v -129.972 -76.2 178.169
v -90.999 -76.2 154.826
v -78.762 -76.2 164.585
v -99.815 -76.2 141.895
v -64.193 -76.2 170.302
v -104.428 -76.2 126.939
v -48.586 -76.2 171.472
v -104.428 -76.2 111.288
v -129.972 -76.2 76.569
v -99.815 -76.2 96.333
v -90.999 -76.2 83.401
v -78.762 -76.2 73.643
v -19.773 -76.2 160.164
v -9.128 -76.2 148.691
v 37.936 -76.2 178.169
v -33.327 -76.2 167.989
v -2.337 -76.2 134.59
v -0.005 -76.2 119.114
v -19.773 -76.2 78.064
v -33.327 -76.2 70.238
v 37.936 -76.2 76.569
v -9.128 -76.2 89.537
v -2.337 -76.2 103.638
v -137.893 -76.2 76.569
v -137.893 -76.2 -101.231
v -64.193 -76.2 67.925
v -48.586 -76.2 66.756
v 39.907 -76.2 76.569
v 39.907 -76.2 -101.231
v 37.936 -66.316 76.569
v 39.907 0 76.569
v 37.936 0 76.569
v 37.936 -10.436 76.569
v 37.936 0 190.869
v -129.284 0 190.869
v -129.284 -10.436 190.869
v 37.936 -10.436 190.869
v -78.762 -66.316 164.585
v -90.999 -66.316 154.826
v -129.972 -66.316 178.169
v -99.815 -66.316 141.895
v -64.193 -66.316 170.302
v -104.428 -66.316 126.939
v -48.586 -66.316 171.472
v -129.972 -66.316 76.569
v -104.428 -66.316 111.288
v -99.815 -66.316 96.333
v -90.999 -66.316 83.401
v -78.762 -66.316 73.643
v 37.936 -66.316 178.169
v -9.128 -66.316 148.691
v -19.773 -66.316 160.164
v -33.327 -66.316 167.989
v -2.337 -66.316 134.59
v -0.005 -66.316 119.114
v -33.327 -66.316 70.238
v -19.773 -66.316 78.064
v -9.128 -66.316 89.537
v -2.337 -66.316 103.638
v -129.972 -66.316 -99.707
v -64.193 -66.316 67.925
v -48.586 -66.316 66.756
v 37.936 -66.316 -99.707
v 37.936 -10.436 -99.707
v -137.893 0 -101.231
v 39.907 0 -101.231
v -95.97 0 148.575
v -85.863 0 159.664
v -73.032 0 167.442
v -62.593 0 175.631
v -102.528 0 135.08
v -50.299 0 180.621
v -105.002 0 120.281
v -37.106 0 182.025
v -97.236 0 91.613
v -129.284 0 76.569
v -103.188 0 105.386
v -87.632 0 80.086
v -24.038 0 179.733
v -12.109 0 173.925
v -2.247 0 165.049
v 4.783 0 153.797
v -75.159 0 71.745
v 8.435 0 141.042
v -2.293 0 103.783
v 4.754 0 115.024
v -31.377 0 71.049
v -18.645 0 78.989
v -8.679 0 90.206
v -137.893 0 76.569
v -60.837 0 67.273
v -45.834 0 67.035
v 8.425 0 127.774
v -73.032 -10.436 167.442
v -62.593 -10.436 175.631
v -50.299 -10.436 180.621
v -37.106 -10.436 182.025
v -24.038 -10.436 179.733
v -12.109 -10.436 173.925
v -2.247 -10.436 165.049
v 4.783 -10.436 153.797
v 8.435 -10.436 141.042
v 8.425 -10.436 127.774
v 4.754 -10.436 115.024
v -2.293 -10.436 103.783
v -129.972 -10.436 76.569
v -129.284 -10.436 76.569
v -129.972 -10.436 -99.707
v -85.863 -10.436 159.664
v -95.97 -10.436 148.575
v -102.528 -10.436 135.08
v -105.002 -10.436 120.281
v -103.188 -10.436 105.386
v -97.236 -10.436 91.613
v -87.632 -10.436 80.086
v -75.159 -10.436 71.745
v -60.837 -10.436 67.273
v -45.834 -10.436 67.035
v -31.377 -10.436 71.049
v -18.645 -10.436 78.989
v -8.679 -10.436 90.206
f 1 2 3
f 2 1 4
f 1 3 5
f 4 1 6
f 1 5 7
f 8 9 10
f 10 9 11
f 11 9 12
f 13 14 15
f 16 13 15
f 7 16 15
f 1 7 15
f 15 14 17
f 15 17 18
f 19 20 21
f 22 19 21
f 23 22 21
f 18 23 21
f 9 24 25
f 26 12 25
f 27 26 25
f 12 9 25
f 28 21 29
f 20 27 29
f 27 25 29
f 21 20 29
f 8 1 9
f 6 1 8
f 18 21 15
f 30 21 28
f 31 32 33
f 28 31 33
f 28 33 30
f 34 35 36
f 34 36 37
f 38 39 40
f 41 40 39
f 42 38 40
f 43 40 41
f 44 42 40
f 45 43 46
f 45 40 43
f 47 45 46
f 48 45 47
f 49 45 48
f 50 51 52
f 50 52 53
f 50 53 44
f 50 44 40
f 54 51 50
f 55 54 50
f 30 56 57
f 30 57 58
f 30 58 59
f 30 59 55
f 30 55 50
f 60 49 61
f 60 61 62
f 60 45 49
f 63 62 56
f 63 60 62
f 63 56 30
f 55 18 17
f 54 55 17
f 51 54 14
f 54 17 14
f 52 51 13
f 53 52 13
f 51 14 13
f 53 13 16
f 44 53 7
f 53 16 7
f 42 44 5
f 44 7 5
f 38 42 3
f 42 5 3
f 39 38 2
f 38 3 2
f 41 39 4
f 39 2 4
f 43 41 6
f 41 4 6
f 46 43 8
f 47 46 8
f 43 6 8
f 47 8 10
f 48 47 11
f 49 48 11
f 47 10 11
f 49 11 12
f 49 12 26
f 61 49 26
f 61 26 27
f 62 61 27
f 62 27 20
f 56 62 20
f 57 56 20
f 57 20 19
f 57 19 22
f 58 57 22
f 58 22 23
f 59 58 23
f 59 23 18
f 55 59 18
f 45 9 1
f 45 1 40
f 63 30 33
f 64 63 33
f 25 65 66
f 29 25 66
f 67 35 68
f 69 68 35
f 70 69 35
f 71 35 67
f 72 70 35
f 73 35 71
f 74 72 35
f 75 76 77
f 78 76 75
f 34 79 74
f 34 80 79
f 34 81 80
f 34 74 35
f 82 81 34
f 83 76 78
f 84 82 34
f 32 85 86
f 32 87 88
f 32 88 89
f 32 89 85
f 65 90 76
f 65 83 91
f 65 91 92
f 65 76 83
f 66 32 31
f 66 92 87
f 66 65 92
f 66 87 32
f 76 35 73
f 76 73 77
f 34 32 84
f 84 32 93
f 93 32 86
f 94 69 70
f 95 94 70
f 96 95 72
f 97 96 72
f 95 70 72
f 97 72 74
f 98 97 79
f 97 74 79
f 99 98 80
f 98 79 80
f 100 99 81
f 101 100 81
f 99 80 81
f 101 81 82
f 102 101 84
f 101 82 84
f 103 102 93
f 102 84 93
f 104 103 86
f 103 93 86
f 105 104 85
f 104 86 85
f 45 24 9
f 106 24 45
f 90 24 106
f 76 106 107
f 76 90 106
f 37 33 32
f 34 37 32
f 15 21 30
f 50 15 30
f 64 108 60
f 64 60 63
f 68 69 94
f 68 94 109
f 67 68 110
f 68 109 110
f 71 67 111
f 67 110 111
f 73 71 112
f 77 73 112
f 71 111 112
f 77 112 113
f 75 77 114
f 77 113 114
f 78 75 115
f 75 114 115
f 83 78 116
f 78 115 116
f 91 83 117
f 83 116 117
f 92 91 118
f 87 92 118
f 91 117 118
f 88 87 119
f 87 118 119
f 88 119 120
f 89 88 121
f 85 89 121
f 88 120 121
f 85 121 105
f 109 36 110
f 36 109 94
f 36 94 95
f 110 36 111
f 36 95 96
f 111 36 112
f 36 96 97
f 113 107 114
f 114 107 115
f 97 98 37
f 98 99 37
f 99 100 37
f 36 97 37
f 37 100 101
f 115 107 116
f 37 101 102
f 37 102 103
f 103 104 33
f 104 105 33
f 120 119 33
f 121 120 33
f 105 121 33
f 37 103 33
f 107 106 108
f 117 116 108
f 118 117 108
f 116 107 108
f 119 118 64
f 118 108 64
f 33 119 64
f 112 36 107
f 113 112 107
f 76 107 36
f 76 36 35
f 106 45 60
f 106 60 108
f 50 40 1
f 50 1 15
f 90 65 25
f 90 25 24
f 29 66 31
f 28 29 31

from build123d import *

# Parameters (mm, degrees)
F0_W      = 177.8
F0_H      = 177.8
F1_DEPTH  = 76.2
F2_W      = 167.9080887029
F2_H      = 55.88
F3_DEPTH  = 176.276
F4_W      = 167.9080887029
F4_H      = 9.8836272268
F5_DEPTH  = 101.6
F6_W      = 167.2196879183
F6_H      = 10.4363727732
F7_DEPTH  = 114.3
F8_R      = 47.6089031409
F9_DEPTH  = 41.91
F10_R     = 52.5050220685
F11_DEPTH = 159.004


with BuildPart() as f1:
    # F0 (on Front) → F1 (new body)
    with BuildSketch(Plane.XZ):
        with Locations((-48.9930282295, -12.3306500904)):
            Rectangle(F0_W, F0_H)
    extrude(amount=F1_DEPTH)

    # F2 (on face) → F3 (cut)
    with BuildSketch(Plane.XY.offset(76.5693499096)):
        with Locations((-46.0179038346, -38.3763727732)):
            Rectangle(F2_W, F2_H)
    extrude(amount=-F3_DEPTH, mode=Mode.SUBTRACT)

    # F4 (on face) → F5 (join)
    with BuildSketch(Plane.XY.offset(76.5693499096)):
        with Locations((-46.0179038346, -71.2581863866)):
            Rectangle(F4_W, F4_H)
    extrude(amount=F5_DEPTH)

    # F6 (on face) → F7 (join)
    with BuildSketch(Plane.XY.offset(76.5693499096)):
        with Locations((-45.6737034423, -5.2181863866)):
            Rectangle(F6_W, F6_H)
    extrude(amount=F7_DEPTH)

    # F8 (on face) → F9 (cut)
    with BuildSketch(Plane(origin=(0, 0, 0), x_dir=(-1, 0, 0), z_dir=(0, 1, 0))):
        with Locations((38.7143976986, 134.4432979822)):
            Circle(F8_R)
    extrude(amount=-F9_DEPTH, mode=Mode.SUBTRACT)

    # F10 (on face) → F11 (cut)
    with BuildSketch(Plane.XZ.offset(76.2)):
        with Locations((-52.5096356869, 119.113817811)):
            Circle(F10_R)
    extrude(amount=-F11_DEPTH, mode=Mode.SUBTRACT)


solid = f1.part
